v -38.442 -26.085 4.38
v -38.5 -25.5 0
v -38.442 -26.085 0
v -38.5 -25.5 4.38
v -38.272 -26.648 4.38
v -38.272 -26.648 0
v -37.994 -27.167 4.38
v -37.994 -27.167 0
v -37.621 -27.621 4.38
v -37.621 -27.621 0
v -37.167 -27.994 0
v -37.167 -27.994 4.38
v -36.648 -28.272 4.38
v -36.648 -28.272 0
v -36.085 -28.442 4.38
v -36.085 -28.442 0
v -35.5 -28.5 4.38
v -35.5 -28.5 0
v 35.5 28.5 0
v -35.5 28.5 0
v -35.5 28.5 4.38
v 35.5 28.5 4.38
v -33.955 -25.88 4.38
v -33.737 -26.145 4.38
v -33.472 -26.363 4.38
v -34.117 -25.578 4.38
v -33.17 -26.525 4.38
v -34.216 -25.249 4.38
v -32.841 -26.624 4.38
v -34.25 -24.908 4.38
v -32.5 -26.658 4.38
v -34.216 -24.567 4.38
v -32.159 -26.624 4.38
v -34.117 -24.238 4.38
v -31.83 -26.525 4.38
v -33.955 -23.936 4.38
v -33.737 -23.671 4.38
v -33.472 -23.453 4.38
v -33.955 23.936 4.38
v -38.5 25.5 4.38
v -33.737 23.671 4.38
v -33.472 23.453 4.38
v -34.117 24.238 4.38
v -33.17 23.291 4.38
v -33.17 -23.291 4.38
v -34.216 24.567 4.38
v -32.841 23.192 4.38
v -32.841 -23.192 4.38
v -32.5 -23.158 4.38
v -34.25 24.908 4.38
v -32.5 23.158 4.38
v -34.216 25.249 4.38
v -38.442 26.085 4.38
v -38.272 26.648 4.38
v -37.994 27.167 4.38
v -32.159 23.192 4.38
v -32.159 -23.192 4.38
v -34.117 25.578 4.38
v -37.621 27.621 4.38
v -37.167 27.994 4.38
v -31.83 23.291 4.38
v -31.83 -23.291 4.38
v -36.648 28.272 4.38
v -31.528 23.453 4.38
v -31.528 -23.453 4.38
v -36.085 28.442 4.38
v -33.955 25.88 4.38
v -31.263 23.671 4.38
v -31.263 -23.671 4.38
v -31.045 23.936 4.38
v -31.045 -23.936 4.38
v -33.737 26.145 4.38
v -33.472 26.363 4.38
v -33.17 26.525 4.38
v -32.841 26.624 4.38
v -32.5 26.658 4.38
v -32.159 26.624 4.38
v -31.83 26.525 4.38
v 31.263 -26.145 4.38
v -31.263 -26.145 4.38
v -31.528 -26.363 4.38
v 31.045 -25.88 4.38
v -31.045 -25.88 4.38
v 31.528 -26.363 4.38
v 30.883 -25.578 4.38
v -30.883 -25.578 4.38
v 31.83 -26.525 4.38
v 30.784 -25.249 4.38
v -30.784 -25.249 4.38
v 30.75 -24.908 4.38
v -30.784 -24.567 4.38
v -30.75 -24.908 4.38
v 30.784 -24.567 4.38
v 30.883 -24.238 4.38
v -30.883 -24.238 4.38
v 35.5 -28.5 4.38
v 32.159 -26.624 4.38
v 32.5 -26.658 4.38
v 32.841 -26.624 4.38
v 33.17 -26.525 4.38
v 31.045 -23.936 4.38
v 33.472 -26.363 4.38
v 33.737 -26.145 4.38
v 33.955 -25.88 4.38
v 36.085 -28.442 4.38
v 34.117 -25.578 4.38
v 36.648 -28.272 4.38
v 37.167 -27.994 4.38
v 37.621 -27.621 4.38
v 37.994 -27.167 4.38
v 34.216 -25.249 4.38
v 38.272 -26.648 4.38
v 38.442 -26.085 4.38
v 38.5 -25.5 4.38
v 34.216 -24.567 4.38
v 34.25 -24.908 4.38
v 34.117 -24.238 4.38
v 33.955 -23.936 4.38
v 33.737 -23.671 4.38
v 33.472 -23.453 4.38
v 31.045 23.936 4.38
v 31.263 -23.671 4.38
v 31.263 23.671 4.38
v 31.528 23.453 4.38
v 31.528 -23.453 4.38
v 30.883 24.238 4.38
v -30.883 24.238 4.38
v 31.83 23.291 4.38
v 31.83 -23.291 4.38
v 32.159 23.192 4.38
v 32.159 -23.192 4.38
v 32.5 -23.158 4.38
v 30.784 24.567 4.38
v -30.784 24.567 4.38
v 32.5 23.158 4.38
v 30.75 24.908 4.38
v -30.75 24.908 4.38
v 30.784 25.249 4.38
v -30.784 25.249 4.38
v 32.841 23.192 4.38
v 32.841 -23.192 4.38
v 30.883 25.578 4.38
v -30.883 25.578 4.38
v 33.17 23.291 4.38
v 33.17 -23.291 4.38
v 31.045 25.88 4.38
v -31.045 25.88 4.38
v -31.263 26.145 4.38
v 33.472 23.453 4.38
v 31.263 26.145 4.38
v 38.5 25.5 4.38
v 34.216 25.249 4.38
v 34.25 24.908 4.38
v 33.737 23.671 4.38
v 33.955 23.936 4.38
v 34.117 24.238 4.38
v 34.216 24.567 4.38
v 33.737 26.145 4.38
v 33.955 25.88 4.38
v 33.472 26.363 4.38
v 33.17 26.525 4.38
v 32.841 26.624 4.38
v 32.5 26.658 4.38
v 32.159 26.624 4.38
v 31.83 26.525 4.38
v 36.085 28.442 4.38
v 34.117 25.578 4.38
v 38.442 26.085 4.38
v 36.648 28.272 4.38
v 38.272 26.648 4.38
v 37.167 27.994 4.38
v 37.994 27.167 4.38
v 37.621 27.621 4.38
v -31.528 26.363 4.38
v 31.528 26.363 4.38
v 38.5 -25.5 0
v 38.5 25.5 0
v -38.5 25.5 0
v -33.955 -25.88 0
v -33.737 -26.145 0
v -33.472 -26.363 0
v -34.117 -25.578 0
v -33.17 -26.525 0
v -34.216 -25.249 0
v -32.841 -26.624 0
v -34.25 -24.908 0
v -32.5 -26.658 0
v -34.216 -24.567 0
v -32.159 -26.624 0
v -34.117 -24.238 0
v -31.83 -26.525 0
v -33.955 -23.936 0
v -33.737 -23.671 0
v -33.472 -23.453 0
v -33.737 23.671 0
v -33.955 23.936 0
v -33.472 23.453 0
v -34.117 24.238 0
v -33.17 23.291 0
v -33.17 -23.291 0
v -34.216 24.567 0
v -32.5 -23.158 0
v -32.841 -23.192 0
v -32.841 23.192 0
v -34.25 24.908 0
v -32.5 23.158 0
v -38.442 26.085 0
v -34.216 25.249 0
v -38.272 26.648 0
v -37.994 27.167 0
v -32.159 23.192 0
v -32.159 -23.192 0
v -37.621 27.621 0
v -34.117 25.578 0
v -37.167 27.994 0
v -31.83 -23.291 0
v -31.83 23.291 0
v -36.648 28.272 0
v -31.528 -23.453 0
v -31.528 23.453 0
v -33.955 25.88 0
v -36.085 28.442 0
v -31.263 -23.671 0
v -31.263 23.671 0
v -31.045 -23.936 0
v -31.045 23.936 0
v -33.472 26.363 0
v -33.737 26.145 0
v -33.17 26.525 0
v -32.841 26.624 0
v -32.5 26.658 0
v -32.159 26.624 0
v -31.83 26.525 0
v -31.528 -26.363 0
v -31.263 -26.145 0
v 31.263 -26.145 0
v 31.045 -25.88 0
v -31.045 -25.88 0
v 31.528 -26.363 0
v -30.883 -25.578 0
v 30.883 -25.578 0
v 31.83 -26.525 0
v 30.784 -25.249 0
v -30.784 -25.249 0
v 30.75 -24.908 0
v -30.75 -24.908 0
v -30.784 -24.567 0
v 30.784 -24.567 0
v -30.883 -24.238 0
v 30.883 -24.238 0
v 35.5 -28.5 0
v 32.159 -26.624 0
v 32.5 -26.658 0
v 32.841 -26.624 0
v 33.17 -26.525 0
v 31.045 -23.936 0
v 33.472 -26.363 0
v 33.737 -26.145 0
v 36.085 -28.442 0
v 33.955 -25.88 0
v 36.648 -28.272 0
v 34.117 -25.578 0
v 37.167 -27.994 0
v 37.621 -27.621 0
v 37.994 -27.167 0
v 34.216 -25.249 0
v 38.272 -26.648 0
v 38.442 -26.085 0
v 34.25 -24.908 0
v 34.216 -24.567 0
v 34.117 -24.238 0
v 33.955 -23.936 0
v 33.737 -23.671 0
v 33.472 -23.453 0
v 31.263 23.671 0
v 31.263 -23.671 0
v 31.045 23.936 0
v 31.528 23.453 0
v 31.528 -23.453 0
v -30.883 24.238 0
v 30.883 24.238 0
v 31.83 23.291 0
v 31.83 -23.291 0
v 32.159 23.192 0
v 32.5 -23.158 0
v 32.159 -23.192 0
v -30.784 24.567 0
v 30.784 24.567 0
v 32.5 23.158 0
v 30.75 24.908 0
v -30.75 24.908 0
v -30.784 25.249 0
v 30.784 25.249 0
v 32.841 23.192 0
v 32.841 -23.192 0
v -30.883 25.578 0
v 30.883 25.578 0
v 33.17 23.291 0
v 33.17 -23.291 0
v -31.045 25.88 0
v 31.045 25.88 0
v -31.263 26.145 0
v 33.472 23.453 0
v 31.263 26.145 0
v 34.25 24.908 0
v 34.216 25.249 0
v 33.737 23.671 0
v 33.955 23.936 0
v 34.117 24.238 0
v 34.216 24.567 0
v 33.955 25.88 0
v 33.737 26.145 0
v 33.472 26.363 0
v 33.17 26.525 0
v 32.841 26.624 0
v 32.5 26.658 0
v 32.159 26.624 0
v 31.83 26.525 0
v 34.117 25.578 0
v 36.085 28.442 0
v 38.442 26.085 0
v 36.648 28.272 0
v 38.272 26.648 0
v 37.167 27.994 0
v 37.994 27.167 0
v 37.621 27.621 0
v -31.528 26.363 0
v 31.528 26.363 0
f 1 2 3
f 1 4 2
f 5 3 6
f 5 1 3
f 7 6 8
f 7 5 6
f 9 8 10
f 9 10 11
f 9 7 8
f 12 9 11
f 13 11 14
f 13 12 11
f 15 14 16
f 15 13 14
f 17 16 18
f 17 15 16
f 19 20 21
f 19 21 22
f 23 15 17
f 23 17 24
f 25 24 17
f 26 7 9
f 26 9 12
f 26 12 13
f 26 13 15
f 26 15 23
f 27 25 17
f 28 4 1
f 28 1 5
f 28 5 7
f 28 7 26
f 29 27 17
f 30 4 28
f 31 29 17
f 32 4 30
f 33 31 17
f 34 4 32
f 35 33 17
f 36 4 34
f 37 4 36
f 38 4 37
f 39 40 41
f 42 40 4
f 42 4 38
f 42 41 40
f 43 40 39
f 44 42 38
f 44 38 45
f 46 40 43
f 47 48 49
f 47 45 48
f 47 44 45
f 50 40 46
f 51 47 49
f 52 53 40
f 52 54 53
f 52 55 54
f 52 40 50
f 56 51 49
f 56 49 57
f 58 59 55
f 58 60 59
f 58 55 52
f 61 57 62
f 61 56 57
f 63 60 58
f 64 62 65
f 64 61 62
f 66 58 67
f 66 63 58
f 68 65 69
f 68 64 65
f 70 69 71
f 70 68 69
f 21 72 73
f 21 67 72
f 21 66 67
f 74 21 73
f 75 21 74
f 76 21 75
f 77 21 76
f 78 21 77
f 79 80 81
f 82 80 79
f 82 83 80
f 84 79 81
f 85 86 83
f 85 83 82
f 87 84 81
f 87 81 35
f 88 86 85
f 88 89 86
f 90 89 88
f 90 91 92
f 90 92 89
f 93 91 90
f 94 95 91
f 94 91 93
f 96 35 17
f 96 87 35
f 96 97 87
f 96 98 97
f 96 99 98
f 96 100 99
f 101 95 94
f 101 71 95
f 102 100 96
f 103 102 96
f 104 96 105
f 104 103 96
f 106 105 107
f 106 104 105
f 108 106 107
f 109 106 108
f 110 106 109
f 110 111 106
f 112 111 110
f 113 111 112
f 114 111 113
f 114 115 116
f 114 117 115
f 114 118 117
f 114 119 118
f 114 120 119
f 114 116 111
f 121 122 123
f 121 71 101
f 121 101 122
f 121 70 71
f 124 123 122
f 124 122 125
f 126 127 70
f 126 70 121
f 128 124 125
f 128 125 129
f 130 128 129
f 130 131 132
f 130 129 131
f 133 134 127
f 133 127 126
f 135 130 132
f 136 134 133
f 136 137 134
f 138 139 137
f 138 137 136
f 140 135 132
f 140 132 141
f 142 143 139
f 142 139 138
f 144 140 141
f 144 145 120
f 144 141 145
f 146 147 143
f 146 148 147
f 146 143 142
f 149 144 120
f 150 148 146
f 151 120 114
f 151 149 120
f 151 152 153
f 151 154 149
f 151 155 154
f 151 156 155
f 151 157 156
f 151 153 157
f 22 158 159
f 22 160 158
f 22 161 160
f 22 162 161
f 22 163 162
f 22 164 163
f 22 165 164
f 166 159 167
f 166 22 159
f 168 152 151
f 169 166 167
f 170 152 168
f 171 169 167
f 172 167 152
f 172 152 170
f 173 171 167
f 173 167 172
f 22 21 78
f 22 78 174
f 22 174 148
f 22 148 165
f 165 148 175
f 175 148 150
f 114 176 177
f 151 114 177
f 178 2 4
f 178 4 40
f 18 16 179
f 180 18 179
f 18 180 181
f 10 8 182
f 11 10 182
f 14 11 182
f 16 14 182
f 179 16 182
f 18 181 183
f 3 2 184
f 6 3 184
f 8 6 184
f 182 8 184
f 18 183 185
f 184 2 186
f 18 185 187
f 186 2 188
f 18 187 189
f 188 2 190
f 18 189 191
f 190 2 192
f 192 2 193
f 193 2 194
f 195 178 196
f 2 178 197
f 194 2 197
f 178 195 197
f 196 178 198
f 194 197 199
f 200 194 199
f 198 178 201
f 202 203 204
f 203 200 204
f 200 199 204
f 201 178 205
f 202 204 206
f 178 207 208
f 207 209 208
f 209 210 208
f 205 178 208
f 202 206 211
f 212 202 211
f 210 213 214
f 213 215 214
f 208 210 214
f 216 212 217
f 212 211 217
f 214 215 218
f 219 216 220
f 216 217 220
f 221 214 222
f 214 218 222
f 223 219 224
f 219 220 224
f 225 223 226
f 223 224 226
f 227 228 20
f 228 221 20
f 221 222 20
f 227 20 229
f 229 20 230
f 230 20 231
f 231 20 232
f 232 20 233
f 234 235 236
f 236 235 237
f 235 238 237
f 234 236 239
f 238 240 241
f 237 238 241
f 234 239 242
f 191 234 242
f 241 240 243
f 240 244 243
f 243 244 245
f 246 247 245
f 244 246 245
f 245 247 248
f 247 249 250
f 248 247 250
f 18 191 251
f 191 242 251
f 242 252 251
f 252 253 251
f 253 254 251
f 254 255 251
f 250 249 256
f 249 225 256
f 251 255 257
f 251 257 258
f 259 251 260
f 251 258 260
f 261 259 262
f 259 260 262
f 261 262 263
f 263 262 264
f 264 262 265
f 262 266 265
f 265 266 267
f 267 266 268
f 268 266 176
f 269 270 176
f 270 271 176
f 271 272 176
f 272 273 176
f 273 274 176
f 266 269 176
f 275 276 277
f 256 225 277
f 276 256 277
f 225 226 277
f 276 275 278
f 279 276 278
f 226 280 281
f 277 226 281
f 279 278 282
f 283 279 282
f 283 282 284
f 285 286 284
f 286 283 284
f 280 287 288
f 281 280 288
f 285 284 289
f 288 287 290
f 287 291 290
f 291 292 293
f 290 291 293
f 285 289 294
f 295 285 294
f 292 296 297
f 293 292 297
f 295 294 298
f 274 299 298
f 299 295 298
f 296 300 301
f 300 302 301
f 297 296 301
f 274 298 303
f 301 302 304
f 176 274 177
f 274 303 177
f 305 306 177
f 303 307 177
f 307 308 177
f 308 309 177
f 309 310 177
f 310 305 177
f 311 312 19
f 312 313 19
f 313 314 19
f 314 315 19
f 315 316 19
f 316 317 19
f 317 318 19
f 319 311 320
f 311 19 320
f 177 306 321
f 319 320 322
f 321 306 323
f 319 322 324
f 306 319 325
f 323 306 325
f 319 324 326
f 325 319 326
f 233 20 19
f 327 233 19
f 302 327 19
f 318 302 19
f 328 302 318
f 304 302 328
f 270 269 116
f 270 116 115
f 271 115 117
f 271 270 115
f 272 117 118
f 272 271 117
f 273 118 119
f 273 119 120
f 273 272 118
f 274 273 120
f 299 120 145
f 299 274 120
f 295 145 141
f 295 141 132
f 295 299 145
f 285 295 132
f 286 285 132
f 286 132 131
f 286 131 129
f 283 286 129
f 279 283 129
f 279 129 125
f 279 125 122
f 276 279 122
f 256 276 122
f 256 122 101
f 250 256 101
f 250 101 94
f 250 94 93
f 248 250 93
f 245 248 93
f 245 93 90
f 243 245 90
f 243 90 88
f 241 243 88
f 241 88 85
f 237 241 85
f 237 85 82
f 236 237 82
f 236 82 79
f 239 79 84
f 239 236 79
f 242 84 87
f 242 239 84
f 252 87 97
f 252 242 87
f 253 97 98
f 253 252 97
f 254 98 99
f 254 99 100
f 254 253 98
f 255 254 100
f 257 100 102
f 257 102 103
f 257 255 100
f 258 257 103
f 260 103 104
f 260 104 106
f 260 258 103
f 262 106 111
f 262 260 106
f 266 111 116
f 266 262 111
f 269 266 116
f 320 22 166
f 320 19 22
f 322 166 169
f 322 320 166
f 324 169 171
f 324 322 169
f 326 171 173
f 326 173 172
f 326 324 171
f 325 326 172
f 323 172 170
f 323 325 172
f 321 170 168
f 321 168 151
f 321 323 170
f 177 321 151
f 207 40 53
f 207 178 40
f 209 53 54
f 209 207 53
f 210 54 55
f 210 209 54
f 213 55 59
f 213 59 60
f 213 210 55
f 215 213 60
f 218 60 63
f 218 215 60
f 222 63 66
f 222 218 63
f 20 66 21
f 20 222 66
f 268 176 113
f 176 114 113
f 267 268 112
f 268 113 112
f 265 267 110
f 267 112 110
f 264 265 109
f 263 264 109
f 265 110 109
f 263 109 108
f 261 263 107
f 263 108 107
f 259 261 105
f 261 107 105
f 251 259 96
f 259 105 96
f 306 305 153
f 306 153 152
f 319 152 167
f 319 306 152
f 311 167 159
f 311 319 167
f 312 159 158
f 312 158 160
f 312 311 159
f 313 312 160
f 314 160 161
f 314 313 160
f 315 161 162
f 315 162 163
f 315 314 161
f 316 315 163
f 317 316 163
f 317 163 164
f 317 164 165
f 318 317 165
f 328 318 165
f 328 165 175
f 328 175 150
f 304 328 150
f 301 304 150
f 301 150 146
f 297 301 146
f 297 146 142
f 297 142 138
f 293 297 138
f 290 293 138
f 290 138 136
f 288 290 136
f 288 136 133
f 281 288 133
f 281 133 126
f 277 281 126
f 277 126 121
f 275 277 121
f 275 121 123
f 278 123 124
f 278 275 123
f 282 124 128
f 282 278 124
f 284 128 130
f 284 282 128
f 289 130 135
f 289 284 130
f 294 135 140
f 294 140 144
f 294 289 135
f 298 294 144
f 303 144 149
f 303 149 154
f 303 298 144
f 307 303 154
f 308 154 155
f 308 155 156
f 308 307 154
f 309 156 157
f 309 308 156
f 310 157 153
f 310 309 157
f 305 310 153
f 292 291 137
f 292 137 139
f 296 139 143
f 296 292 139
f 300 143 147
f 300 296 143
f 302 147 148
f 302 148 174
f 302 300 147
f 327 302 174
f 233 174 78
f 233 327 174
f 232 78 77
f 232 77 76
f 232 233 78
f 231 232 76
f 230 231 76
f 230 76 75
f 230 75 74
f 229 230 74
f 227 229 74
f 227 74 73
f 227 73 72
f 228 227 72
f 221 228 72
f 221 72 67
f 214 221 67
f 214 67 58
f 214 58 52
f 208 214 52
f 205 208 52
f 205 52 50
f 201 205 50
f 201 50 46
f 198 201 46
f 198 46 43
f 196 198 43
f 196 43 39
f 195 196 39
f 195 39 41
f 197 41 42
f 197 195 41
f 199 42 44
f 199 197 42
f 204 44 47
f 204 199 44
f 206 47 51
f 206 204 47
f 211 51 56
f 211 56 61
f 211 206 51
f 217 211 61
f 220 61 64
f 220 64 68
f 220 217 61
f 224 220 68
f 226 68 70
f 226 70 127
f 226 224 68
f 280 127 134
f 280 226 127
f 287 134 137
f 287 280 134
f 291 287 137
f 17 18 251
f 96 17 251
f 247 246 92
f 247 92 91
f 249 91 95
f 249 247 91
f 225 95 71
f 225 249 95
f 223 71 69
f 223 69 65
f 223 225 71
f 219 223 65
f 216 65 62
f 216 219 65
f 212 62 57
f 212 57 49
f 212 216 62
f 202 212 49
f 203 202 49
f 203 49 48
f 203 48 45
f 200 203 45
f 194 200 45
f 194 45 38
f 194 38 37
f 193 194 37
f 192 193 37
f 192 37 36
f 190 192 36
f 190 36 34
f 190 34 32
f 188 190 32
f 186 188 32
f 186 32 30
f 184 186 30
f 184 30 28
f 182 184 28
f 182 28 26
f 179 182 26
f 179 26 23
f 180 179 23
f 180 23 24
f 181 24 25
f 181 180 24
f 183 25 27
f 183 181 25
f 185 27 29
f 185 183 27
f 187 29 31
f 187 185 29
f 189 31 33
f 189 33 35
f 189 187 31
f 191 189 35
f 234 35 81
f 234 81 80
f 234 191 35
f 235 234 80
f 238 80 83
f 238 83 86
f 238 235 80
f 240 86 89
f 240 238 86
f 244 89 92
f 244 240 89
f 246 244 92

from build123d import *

# Parameters (mm, degrees)
F0_W     = 77
F0_H     = 57
F0_R     = 1.75
F1_DEPTH = 4.38
F2_DEPTH = 3.2
F3_R     = 3


with BuildPart() as f1:
    # F0 (on Top) → F1 (new body)
    with BuildSketch(Plane.XY):
        Rectangle(F0_W, F0_H)
        with Locations((-32.5, -24.908)):
            Circle(F0_R, mode=Mode.SUBTRACT)
        with Locations((32.5, -24.908)):
            Circle(F0_R, mode=Mode.SUBTRACT)
        with Locations((-32.5, 24.908)):
            Circle(F0_R, mode=Mode.SUBTRACT)
        with Locations((32.5, 24.908)):
            Circle(F0_R, mode=Mode.SUBTRACT)
    extrude(amount=F1_DEPTH)

    # F0 (on Top) → F2 (join)
    with BuildSketch(Plane.XY):
        Rectangle(F0_W, F0_H)
        with Locations((-32.5, -24.908)):
            Circle(F0_R, mode=Mode.SUBTRACT)
        with Locations((32.5, -24.908)):
            Circle(F0_R, mode=Mode.SUBTRACT)
        with Locations((-32.5, 24.908)):
            Circle(F0_R, mode=Mode.SUBTRACT)
        with Locations((32.5, 24.908)):
            Circle(F0_R, mode=Mode.SUBTRACT)
    extrude(amount=F2_DEPTH)

    # F3
    f3_edges = [f1.edges().sort_by_distance(p)[0] for p in [
        (-38.5, 28.5, 2.19),
        (-38.5, -28.5, 2.19),
        (38.5, -28.5, 2.19),
        (38.5, 28.5, 2.19),
    ]]
    fillet(f3_edges, radius=F3_R)


solid = f1.part
